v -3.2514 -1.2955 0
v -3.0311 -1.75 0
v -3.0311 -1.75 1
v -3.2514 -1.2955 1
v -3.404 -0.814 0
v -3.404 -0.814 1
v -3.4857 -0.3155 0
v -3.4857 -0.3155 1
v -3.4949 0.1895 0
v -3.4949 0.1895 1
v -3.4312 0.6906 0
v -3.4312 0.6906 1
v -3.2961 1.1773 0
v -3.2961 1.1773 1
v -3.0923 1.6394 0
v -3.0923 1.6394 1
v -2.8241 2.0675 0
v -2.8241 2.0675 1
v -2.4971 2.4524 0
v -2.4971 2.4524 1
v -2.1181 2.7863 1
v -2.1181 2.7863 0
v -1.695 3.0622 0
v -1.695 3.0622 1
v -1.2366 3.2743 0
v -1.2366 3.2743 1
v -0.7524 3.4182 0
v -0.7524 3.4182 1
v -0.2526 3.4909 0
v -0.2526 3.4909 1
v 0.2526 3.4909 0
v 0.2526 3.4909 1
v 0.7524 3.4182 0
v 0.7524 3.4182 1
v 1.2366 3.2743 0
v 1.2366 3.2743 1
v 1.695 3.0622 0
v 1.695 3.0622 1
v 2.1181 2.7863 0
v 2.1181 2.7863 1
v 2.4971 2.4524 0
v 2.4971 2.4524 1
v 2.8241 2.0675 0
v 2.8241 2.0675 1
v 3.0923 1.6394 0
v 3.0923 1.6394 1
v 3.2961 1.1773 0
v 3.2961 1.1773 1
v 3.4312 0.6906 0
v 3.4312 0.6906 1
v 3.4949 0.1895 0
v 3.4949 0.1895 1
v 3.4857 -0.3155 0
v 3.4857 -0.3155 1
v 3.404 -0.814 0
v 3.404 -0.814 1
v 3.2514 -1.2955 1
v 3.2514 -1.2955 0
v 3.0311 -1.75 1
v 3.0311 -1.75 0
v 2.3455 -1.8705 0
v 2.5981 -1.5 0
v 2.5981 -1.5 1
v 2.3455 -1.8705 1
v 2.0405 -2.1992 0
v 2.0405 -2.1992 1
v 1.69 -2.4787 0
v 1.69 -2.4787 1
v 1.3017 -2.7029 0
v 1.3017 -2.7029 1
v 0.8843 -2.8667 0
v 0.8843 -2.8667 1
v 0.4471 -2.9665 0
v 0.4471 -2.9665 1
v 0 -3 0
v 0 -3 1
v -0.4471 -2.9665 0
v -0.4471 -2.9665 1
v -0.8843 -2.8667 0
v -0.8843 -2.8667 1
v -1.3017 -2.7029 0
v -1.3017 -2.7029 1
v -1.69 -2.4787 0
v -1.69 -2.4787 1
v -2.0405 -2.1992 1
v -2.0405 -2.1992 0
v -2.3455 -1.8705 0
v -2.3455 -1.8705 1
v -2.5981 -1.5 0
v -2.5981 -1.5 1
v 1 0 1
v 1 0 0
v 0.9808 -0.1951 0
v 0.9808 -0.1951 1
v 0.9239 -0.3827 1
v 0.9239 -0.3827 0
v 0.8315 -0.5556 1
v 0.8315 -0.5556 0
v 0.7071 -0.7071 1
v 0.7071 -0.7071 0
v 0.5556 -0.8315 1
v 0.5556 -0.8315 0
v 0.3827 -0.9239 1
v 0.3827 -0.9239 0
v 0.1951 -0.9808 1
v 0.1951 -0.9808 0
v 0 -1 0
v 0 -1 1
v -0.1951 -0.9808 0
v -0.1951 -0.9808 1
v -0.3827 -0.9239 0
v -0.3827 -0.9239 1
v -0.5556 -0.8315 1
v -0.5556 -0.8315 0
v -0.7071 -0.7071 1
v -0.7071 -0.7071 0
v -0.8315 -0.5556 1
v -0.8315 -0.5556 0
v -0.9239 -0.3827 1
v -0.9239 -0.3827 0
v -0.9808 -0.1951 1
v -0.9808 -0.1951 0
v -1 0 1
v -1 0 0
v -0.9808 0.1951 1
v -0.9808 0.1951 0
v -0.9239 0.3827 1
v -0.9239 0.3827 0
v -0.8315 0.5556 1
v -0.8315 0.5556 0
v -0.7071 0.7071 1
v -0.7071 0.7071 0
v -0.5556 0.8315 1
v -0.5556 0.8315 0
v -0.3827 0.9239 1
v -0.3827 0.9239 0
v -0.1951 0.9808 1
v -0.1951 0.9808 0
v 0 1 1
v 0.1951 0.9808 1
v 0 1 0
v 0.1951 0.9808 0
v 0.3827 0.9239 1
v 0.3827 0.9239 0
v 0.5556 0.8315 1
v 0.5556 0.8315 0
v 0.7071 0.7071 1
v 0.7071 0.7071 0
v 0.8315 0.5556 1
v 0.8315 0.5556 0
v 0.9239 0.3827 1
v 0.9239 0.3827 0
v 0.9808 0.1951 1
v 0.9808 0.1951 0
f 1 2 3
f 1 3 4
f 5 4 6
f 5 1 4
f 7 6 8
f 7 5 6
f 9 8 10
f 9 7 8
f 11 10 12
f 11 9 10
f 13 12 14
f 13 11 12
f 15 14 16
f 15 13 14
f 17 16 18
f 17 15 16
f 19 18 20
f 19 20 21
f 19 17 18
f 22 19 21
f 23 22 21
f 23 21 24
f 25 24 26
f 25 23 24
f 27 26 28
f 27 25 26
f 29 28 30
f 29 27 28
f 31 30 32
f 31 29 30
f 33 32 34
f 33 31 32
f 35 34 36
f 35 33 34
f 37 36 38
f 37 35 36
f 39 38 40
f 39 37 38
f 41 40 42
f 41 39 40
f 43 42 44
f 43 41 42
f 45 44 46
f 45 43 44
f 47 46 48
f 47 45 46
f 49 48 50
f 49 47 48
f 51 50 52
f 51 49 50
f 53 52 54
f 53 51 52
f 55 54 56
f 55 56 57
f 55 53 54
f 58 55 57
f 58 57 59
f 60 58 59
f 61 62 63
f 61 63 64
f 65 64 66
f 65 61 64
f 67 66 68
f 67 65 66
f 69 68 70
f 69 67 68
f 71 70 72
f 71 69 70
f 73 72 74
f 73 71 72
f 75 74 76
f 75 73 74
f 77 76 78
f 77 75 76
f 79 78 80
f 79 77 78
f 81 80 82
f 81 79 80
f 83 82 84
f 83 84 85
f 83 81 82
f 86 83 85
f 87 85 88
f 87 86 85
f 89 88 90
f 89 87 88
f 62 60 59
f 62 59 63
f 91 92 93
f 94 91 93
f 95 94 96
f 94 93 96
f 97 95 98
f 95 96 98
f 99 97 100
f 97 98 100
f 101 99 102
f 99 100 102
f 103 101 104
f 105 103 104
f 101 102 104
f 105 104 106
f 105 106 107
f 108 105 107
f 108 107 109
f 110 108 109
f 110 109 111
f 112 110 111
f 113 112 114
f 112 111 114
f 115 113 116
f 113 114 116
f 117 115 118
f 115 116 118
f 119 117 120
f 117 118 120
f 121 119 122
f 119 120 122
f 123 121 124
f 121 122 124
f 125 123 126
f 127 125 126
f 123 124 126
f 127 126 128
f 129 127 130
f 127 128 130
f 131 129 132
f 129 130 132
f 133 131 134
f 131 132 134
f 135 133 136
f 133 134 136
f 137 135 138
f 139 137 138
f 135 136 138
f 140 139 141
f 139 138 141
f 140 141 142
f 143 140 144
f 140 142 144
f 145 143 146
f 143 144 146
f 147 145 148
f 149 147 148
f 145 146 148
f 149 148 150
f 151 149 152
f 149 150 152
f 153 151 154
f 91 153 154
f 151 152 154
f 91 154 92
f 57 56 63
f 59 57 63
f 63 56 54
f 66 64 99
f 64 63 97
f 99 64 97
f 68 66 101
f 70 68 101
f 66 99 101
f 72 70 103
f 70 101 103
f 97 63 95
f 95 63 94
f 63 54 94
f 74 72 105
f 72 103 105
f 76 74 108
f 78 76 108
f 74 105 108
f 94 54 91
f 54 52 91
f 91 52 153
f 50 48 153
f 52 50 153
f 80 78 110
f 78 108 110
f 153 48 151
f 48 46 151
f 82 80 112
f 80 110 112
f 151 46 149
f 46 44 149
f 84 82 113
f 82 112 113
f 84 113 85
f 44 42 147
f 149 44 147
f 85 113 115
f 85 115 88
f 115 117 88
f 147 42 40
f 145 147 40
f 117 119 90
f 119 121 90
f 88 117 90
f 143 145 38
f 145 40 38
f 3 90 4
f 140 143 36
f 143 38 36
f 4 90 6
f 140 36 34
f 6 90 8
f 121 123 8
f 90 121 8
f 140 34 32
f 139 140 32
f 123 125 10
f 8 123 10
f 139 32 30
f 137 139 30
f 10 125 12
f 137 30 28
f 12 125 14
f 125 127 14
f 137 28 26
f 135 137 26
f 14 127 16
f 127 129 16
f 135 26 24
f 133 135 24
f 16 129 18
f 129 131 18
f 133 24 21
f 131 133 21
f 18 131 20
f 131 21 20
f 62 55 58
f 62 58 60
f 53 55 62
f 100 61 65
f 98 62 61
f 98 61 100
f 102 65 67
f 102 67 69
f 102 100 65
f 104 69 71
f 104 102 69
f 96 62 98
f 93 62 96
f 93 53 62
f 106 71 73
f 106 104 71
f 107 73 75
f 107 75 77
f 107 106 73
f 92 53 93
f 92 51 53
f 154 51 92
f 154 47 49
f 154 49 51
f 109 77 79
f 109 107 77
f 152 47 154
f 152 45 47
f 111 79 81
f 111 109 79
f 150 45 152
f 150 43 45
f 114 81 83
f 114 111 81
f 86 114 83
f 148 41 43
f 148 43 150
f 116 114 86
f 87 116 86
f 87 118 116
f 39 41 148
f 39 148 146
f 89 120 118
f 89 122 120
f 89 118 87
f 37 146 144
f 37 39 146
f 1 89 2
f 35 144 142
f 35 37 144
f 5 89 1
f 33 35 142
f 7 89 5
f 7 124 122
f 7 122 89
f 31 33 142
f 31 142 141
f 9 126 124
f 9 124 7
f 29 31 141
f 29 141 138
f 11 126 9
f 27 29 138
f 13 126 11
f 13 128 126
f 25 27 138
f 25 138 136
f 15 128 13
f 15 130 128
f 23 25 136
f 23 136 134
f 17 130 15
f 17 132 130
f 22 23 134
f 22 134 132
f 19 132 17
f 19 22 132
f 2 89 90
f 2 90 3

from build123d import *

# Parameters (mm, degrees)
SKETCH1_R           = 1
BOSS_EXTRUDE1_DEPTH = 1


with BuildPart() as part:
    # Sketch1 → Boss-Extrude1 (new body)
    with BuildSketch(Plane(origin=(0, 0, 0), x_dir=(-1, 0, 0), z_dir=(0, 0, -1))):
        with BuildLine():
            Line((-3.031088913, -1.75), (-2.598076211, -1.5))
            ThreePointArc((-2.598076211, -1.5), (0, -3), (2.598076211, -1.5))
            Line((2.598076211, -1.5), (3.031088913, -1.75))
            ThreePointArc((3.031088913, -1.75), (0, 3.5), (-3.031088913, -1.75))
        make_face()
        with Locations(Location((0, 0, 0), (0, 0, 180))):
            Circle(SKETCH1_R, mode=Mode.SUBTRACT)
    extrude(amount=-BOSS_EXTRUDE1_DEPTH)


solid = part.part
